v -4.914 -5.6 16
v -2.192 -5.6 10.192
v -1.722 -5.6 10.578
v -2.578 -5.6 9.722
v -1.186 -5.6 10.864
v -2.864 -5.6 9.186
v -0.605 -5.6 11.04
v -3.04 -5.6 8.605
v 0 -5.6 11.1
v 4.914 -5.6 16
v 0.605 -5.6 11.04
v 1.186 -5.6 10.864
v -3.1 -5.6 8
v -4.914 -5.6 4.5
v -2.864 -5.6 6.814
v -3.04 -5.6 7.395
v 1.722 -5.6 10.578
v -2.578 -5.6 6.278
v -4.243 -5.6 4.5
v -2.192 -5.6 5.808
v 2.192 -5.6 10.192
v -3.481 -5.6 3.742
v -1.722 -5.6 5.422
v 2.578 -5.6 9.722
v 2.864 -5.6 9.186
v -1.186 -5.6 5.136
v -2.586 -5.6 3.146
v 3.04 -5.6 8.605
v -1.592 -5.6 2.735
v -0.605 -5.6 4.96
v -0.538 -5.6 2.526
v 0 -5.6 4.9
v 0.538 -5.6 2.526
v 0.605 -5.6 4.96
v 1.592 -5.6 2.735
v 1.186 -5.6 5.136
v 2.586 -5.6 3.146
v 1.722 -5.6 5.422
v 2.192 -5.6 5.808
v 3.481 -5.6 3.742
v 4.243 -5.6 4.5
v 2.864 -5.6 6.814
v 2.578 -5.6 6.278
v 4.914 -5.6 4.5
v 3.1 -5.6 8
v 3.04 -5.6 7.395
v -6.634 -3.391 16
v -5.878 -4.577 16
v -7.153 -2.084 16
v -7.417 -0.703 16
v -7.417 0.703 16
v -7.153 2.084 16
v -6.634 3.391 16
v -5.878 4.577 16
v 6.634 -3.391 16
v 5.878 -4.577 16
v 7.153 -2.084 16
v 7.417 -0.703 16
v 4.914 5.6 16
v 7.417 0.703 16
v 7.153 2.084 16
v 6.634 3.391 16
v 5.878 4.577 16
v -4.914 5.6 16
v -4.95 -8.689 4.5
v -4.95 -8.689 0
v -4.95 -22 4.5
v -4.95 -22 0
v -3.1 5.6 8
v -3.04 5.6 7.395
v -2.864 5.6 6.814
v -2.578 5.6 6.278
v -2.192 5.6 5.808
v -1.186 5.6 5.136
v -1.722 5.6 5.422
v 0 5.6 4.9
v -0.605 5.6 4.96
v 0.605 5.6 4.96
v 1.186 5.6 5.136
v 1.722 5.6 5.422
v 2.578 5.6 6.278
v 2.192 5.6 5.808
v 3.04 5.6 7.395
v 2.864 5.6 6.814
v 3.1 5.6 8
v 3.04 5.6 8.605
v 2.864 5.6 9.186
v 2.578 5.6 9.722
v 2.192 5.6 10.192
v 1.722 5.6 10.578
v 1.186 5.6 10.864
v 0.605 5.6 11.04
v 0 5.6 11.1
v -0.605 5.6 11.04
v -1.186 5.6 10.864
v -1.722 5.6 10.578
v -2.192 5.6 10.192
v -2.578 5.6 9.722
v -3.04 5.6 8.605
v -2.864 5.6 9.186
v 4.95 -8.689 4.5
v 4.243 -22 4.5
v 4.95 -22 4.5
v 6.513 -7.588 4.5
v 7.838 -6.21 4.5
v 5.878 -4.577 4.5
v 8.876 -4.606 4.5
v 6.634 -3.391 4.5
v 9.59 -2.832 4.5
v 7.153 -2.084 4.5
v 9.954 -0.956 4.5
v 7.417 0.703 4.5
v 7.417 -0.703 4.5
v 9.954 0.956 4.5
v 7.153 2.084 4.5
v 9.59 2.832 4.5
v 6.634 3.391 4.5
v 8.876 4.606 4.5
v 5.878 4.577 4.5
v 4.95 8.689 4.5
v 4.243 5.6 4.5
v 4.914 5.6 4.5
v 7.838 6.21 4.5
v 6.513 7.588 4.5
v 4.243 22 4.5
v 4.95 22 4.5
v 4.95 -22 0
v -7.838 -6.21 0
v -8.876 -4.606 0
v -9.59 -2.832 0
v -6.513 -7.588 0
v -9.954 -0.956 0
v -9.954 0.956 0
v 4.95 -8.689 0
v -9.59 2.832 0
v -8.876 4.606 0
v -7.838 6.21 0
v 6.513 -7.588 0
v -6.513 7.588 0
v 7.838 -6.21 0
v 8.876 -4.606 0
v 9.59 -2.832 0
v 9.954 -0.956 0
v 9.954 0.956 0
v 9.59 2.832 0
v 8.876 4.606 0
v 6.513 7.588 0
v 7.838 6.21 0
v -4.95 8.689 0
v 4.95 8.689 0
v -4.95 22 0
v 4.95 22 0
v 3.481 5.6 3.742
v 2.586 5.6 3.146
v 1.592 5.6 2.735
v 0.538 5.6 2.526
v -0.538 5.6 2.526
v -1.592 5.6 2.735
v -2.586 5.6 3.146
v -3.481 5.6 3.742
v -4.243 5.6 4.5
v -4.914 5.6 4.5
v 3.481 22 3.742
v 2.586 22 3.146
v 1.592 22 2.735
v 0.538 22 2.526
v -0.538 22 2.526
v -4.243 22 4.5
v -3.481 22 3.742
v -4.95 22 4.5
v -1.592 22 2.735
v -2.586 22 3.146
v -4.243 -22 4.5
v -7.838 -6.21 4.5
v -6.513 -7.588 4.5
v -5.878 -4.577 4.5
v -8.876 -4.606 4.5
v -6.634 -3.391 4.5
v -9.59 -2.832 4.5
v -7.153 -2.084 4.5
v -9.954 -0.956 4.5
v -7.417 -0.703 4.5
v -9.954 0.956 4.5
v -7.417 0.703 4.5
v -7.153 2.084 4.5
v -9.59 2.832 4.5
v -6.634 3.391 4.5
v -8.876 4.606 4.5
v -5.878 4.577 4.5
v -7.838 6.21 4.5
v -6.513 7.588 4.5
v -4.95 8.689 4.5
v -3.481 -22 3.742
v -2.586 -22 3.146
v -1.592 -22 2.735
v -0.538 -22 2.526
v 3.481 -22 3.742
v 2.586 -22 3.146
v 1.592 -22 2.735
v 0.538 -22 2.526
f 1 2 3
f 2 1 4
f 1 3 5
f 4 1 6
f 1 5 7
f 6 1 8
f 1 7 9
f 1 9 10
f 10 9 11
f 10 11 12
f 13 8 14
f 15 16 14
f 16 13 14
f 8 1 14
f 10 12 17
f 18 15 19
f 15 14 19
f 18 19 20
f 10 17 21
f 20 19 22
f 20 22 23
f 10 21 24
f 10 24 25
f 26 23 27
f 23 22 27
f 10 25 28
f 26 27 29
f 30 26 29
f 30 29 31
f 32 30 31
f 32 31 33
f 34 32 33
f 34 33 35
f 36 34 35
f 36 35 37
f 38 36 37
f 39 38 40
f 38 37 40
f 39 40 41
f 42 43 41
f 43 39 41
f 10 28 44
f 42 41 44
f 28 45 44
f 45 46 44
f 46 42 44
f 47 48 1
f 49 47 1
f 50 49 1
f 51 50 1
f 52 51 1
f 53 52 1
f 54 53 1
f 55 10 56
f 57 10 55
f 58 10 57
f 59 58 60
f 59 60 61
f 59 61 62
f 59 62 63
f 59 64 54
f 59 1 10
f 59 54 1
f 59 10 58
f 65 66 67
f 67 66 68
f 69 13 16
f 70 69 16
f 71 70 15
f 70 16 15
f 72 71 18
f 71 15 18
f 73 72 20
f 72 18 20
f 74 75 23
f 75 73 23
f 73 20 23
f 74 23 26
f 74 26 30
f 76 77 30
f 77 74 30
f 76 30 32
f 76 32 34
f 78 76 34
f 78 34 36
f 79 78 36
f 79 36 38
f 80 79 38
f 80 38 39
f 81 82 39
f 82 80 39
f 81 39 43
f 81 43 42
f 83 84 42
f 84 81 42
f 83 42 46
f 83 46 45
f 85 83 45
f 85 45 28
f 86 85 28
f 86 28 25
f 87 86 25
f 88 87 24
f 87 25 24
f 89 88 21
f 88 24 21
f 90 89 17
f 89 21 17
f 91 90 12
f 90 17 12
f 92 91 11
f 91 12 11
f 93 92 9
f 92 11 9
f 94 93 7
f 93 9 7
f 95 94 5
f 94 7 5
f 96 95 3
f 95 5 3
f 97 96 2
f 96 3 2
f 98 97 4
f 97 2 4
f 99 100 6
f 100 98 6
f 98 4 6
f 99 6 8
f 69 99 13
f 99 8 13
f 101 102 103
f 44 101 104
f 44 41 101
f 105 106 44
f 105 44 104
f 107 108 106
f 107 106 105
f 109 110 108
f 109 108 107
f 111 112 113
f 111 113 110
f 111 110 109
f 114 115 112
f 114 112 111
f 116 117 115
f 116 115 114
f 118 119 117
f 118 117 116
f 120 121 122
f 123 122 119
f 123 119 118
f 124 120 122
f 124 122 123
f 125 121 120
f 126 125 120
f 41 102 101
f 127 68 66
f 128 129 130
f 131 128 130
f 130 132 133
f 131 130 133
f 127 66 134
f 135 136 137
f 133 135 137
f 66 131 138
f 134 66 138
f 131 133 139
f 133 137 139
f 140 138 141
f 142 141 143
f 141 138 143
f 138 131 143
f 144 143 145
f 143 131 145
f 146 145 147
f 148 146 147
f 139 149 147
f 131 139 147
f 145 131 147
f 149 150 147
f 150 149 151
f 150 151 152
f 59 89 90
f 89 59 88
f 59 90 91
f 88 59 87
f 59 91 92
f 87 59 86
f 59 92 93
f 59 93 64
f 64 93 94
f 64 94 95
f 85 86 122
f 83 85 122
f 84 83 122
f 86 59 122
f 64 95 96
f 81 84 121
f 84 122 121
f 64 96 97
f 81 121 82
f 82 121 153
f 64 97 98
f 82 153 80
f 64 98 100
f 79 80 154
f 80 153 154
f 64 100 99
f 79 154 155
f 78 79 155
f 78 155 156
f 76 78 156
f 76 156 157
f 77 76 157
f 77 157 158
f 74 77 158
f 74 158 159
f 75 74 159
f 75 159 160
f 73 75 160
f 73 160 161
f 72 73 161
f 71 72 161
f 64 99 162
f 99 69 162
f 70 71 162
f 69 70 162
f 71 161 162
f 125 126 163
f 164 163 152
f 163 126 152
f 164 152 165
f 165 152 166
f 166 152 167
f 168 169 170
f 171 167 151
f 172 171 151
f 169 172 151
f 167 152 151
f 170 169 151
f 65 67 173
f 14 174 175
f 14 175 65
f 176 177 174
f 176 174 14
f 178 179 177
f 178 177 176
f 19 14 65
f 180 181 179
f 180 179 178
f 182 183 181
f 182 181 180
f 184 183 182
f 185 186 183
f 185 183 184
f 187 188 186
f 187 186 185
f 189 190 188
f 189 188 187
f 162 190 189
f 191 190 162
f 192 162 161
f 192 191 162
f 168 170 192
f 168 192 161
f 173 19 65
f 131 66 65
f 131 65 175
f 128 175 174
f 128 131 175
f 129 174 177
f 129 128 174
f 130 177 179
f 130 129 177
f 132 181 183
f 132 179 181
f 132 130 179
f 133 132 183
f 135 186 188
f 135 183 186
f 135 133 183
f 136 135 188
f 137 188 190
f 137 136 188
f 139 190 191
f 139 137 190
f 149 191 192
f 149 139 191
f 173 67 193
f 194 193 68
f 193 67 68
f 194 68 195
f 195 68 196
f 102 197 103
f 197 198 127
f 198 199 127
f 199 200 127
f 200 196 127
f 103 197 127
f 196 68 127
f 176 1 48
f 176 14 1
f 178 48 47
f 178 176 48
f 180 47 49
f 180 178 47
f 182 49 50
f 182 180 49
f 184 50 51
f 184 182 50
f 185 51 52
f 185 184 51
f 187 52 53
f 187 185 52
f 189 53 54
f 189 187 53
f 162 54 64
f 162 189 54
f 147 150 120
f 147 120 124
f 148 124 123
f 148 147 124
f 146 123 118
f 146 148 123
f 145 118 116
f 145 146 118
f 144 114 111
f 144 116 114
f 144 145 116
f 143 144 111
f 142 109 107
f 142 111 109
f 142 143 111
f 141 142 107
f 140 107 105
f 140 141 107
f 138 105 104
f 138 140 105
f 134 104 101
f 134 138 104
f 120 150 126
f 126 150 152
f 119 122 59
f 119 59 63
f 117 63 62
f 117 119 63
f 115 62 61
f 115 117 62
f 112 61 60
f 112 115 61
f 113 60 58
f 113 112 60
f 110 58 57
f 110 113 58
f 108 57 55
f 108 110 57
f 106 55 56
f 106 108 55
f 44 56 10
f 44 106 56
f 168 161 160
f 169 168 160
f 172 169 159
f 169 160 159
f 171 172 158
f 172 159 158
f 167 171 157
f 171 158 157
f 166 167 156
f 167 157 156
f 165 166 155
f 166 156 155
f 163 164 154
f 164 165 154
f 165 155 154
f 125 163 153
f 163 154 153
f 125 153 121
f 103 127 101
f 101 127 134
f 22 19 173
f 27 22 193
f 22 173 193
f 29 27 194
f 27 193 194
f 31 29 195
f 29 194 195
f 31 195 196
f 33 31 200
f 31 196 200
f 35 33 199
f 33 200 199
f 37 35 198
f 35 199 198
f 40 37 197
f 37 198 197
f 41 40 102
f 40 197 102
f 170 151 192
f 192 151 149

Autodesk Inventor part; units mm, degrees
sketch "Sketch_1" plane through (0, 0, 0) normal (0, 0, 1) x (1, 0, 0)
  arc A0 (-4.95, 8.6889) -> (-4.95, -8.6889) centre (0, 0) ccw
  line L0 (-4.95, -8.6889) -> (-4.95, -22)
  line L1 (-4.95, -22) -> (4.95, -22)
  line L2 (4.95, -22) -> (4.95, -8.6889)
  arc A1 (4.95, -8.6889) -> (4.95, 8.6889) centre (0, 0) ccw
  line L3 (4.95, 8.6889) -> (4.95, 22)
  line L4 (4.95, 22) -> (-4.95, 22)
  line L5 (-4.95, 22) -> (-4.95, 8.6889)
extrude "Extrusion1" add sketch "Sketch_1" along normal blind 4.5
sketch "Sketch_2" plane through (0, 0, 0) normal (0, 1, 0) x (-1, 0, 0)
  circle A0 centre (0, 8) radius 5.5
extrude "Extrusion2" cut sketch "Sketch_2" along normal mid plane 44
sketch "Sketch_3" plane through (0, 0, 0) normal (0, 0, 1) x (1, 0, 0)
  arc A0 (-4.9135, 5.6) -> (-4.9135, -5.6) centre (0, 0) ccw
  line L0 (-4.9135, -5.6) -> (4.9135, -5.6)
  arc A1 (4.9135, -5.6) -> (4.9135, 5.6) centre (0, 0) ccw
  line L1 (4.9135, 5.6) -> (-4.9135, 5.6)
extrude "Extrusion3" add sketch "Sketch_3" along normal blind 16
sketch "Sketch_4" plane through (0, 0, 0) normal (0, 1, 0) x (-1, 0, 0)
  circle A0 centre (0, 8) radius 3.1
extrude "Extrusion4" cut sketch "Sketch_4" along normal mid plane 11.2
ref_plane "screw_XY" through (0, 5.6, 8) normal (0, 1, 0) x (1, 0, 0)
ref_plane "screw_YZ" through (0, 5.6, 8) normal (1, 0, 0) x (0, 0, -1)
ref_plane "screw_ZX" through (0, 5.6, 8) normal (0, 0, -1) x (0, 1, 0)
properties part number "HDJSN8-45__j"
